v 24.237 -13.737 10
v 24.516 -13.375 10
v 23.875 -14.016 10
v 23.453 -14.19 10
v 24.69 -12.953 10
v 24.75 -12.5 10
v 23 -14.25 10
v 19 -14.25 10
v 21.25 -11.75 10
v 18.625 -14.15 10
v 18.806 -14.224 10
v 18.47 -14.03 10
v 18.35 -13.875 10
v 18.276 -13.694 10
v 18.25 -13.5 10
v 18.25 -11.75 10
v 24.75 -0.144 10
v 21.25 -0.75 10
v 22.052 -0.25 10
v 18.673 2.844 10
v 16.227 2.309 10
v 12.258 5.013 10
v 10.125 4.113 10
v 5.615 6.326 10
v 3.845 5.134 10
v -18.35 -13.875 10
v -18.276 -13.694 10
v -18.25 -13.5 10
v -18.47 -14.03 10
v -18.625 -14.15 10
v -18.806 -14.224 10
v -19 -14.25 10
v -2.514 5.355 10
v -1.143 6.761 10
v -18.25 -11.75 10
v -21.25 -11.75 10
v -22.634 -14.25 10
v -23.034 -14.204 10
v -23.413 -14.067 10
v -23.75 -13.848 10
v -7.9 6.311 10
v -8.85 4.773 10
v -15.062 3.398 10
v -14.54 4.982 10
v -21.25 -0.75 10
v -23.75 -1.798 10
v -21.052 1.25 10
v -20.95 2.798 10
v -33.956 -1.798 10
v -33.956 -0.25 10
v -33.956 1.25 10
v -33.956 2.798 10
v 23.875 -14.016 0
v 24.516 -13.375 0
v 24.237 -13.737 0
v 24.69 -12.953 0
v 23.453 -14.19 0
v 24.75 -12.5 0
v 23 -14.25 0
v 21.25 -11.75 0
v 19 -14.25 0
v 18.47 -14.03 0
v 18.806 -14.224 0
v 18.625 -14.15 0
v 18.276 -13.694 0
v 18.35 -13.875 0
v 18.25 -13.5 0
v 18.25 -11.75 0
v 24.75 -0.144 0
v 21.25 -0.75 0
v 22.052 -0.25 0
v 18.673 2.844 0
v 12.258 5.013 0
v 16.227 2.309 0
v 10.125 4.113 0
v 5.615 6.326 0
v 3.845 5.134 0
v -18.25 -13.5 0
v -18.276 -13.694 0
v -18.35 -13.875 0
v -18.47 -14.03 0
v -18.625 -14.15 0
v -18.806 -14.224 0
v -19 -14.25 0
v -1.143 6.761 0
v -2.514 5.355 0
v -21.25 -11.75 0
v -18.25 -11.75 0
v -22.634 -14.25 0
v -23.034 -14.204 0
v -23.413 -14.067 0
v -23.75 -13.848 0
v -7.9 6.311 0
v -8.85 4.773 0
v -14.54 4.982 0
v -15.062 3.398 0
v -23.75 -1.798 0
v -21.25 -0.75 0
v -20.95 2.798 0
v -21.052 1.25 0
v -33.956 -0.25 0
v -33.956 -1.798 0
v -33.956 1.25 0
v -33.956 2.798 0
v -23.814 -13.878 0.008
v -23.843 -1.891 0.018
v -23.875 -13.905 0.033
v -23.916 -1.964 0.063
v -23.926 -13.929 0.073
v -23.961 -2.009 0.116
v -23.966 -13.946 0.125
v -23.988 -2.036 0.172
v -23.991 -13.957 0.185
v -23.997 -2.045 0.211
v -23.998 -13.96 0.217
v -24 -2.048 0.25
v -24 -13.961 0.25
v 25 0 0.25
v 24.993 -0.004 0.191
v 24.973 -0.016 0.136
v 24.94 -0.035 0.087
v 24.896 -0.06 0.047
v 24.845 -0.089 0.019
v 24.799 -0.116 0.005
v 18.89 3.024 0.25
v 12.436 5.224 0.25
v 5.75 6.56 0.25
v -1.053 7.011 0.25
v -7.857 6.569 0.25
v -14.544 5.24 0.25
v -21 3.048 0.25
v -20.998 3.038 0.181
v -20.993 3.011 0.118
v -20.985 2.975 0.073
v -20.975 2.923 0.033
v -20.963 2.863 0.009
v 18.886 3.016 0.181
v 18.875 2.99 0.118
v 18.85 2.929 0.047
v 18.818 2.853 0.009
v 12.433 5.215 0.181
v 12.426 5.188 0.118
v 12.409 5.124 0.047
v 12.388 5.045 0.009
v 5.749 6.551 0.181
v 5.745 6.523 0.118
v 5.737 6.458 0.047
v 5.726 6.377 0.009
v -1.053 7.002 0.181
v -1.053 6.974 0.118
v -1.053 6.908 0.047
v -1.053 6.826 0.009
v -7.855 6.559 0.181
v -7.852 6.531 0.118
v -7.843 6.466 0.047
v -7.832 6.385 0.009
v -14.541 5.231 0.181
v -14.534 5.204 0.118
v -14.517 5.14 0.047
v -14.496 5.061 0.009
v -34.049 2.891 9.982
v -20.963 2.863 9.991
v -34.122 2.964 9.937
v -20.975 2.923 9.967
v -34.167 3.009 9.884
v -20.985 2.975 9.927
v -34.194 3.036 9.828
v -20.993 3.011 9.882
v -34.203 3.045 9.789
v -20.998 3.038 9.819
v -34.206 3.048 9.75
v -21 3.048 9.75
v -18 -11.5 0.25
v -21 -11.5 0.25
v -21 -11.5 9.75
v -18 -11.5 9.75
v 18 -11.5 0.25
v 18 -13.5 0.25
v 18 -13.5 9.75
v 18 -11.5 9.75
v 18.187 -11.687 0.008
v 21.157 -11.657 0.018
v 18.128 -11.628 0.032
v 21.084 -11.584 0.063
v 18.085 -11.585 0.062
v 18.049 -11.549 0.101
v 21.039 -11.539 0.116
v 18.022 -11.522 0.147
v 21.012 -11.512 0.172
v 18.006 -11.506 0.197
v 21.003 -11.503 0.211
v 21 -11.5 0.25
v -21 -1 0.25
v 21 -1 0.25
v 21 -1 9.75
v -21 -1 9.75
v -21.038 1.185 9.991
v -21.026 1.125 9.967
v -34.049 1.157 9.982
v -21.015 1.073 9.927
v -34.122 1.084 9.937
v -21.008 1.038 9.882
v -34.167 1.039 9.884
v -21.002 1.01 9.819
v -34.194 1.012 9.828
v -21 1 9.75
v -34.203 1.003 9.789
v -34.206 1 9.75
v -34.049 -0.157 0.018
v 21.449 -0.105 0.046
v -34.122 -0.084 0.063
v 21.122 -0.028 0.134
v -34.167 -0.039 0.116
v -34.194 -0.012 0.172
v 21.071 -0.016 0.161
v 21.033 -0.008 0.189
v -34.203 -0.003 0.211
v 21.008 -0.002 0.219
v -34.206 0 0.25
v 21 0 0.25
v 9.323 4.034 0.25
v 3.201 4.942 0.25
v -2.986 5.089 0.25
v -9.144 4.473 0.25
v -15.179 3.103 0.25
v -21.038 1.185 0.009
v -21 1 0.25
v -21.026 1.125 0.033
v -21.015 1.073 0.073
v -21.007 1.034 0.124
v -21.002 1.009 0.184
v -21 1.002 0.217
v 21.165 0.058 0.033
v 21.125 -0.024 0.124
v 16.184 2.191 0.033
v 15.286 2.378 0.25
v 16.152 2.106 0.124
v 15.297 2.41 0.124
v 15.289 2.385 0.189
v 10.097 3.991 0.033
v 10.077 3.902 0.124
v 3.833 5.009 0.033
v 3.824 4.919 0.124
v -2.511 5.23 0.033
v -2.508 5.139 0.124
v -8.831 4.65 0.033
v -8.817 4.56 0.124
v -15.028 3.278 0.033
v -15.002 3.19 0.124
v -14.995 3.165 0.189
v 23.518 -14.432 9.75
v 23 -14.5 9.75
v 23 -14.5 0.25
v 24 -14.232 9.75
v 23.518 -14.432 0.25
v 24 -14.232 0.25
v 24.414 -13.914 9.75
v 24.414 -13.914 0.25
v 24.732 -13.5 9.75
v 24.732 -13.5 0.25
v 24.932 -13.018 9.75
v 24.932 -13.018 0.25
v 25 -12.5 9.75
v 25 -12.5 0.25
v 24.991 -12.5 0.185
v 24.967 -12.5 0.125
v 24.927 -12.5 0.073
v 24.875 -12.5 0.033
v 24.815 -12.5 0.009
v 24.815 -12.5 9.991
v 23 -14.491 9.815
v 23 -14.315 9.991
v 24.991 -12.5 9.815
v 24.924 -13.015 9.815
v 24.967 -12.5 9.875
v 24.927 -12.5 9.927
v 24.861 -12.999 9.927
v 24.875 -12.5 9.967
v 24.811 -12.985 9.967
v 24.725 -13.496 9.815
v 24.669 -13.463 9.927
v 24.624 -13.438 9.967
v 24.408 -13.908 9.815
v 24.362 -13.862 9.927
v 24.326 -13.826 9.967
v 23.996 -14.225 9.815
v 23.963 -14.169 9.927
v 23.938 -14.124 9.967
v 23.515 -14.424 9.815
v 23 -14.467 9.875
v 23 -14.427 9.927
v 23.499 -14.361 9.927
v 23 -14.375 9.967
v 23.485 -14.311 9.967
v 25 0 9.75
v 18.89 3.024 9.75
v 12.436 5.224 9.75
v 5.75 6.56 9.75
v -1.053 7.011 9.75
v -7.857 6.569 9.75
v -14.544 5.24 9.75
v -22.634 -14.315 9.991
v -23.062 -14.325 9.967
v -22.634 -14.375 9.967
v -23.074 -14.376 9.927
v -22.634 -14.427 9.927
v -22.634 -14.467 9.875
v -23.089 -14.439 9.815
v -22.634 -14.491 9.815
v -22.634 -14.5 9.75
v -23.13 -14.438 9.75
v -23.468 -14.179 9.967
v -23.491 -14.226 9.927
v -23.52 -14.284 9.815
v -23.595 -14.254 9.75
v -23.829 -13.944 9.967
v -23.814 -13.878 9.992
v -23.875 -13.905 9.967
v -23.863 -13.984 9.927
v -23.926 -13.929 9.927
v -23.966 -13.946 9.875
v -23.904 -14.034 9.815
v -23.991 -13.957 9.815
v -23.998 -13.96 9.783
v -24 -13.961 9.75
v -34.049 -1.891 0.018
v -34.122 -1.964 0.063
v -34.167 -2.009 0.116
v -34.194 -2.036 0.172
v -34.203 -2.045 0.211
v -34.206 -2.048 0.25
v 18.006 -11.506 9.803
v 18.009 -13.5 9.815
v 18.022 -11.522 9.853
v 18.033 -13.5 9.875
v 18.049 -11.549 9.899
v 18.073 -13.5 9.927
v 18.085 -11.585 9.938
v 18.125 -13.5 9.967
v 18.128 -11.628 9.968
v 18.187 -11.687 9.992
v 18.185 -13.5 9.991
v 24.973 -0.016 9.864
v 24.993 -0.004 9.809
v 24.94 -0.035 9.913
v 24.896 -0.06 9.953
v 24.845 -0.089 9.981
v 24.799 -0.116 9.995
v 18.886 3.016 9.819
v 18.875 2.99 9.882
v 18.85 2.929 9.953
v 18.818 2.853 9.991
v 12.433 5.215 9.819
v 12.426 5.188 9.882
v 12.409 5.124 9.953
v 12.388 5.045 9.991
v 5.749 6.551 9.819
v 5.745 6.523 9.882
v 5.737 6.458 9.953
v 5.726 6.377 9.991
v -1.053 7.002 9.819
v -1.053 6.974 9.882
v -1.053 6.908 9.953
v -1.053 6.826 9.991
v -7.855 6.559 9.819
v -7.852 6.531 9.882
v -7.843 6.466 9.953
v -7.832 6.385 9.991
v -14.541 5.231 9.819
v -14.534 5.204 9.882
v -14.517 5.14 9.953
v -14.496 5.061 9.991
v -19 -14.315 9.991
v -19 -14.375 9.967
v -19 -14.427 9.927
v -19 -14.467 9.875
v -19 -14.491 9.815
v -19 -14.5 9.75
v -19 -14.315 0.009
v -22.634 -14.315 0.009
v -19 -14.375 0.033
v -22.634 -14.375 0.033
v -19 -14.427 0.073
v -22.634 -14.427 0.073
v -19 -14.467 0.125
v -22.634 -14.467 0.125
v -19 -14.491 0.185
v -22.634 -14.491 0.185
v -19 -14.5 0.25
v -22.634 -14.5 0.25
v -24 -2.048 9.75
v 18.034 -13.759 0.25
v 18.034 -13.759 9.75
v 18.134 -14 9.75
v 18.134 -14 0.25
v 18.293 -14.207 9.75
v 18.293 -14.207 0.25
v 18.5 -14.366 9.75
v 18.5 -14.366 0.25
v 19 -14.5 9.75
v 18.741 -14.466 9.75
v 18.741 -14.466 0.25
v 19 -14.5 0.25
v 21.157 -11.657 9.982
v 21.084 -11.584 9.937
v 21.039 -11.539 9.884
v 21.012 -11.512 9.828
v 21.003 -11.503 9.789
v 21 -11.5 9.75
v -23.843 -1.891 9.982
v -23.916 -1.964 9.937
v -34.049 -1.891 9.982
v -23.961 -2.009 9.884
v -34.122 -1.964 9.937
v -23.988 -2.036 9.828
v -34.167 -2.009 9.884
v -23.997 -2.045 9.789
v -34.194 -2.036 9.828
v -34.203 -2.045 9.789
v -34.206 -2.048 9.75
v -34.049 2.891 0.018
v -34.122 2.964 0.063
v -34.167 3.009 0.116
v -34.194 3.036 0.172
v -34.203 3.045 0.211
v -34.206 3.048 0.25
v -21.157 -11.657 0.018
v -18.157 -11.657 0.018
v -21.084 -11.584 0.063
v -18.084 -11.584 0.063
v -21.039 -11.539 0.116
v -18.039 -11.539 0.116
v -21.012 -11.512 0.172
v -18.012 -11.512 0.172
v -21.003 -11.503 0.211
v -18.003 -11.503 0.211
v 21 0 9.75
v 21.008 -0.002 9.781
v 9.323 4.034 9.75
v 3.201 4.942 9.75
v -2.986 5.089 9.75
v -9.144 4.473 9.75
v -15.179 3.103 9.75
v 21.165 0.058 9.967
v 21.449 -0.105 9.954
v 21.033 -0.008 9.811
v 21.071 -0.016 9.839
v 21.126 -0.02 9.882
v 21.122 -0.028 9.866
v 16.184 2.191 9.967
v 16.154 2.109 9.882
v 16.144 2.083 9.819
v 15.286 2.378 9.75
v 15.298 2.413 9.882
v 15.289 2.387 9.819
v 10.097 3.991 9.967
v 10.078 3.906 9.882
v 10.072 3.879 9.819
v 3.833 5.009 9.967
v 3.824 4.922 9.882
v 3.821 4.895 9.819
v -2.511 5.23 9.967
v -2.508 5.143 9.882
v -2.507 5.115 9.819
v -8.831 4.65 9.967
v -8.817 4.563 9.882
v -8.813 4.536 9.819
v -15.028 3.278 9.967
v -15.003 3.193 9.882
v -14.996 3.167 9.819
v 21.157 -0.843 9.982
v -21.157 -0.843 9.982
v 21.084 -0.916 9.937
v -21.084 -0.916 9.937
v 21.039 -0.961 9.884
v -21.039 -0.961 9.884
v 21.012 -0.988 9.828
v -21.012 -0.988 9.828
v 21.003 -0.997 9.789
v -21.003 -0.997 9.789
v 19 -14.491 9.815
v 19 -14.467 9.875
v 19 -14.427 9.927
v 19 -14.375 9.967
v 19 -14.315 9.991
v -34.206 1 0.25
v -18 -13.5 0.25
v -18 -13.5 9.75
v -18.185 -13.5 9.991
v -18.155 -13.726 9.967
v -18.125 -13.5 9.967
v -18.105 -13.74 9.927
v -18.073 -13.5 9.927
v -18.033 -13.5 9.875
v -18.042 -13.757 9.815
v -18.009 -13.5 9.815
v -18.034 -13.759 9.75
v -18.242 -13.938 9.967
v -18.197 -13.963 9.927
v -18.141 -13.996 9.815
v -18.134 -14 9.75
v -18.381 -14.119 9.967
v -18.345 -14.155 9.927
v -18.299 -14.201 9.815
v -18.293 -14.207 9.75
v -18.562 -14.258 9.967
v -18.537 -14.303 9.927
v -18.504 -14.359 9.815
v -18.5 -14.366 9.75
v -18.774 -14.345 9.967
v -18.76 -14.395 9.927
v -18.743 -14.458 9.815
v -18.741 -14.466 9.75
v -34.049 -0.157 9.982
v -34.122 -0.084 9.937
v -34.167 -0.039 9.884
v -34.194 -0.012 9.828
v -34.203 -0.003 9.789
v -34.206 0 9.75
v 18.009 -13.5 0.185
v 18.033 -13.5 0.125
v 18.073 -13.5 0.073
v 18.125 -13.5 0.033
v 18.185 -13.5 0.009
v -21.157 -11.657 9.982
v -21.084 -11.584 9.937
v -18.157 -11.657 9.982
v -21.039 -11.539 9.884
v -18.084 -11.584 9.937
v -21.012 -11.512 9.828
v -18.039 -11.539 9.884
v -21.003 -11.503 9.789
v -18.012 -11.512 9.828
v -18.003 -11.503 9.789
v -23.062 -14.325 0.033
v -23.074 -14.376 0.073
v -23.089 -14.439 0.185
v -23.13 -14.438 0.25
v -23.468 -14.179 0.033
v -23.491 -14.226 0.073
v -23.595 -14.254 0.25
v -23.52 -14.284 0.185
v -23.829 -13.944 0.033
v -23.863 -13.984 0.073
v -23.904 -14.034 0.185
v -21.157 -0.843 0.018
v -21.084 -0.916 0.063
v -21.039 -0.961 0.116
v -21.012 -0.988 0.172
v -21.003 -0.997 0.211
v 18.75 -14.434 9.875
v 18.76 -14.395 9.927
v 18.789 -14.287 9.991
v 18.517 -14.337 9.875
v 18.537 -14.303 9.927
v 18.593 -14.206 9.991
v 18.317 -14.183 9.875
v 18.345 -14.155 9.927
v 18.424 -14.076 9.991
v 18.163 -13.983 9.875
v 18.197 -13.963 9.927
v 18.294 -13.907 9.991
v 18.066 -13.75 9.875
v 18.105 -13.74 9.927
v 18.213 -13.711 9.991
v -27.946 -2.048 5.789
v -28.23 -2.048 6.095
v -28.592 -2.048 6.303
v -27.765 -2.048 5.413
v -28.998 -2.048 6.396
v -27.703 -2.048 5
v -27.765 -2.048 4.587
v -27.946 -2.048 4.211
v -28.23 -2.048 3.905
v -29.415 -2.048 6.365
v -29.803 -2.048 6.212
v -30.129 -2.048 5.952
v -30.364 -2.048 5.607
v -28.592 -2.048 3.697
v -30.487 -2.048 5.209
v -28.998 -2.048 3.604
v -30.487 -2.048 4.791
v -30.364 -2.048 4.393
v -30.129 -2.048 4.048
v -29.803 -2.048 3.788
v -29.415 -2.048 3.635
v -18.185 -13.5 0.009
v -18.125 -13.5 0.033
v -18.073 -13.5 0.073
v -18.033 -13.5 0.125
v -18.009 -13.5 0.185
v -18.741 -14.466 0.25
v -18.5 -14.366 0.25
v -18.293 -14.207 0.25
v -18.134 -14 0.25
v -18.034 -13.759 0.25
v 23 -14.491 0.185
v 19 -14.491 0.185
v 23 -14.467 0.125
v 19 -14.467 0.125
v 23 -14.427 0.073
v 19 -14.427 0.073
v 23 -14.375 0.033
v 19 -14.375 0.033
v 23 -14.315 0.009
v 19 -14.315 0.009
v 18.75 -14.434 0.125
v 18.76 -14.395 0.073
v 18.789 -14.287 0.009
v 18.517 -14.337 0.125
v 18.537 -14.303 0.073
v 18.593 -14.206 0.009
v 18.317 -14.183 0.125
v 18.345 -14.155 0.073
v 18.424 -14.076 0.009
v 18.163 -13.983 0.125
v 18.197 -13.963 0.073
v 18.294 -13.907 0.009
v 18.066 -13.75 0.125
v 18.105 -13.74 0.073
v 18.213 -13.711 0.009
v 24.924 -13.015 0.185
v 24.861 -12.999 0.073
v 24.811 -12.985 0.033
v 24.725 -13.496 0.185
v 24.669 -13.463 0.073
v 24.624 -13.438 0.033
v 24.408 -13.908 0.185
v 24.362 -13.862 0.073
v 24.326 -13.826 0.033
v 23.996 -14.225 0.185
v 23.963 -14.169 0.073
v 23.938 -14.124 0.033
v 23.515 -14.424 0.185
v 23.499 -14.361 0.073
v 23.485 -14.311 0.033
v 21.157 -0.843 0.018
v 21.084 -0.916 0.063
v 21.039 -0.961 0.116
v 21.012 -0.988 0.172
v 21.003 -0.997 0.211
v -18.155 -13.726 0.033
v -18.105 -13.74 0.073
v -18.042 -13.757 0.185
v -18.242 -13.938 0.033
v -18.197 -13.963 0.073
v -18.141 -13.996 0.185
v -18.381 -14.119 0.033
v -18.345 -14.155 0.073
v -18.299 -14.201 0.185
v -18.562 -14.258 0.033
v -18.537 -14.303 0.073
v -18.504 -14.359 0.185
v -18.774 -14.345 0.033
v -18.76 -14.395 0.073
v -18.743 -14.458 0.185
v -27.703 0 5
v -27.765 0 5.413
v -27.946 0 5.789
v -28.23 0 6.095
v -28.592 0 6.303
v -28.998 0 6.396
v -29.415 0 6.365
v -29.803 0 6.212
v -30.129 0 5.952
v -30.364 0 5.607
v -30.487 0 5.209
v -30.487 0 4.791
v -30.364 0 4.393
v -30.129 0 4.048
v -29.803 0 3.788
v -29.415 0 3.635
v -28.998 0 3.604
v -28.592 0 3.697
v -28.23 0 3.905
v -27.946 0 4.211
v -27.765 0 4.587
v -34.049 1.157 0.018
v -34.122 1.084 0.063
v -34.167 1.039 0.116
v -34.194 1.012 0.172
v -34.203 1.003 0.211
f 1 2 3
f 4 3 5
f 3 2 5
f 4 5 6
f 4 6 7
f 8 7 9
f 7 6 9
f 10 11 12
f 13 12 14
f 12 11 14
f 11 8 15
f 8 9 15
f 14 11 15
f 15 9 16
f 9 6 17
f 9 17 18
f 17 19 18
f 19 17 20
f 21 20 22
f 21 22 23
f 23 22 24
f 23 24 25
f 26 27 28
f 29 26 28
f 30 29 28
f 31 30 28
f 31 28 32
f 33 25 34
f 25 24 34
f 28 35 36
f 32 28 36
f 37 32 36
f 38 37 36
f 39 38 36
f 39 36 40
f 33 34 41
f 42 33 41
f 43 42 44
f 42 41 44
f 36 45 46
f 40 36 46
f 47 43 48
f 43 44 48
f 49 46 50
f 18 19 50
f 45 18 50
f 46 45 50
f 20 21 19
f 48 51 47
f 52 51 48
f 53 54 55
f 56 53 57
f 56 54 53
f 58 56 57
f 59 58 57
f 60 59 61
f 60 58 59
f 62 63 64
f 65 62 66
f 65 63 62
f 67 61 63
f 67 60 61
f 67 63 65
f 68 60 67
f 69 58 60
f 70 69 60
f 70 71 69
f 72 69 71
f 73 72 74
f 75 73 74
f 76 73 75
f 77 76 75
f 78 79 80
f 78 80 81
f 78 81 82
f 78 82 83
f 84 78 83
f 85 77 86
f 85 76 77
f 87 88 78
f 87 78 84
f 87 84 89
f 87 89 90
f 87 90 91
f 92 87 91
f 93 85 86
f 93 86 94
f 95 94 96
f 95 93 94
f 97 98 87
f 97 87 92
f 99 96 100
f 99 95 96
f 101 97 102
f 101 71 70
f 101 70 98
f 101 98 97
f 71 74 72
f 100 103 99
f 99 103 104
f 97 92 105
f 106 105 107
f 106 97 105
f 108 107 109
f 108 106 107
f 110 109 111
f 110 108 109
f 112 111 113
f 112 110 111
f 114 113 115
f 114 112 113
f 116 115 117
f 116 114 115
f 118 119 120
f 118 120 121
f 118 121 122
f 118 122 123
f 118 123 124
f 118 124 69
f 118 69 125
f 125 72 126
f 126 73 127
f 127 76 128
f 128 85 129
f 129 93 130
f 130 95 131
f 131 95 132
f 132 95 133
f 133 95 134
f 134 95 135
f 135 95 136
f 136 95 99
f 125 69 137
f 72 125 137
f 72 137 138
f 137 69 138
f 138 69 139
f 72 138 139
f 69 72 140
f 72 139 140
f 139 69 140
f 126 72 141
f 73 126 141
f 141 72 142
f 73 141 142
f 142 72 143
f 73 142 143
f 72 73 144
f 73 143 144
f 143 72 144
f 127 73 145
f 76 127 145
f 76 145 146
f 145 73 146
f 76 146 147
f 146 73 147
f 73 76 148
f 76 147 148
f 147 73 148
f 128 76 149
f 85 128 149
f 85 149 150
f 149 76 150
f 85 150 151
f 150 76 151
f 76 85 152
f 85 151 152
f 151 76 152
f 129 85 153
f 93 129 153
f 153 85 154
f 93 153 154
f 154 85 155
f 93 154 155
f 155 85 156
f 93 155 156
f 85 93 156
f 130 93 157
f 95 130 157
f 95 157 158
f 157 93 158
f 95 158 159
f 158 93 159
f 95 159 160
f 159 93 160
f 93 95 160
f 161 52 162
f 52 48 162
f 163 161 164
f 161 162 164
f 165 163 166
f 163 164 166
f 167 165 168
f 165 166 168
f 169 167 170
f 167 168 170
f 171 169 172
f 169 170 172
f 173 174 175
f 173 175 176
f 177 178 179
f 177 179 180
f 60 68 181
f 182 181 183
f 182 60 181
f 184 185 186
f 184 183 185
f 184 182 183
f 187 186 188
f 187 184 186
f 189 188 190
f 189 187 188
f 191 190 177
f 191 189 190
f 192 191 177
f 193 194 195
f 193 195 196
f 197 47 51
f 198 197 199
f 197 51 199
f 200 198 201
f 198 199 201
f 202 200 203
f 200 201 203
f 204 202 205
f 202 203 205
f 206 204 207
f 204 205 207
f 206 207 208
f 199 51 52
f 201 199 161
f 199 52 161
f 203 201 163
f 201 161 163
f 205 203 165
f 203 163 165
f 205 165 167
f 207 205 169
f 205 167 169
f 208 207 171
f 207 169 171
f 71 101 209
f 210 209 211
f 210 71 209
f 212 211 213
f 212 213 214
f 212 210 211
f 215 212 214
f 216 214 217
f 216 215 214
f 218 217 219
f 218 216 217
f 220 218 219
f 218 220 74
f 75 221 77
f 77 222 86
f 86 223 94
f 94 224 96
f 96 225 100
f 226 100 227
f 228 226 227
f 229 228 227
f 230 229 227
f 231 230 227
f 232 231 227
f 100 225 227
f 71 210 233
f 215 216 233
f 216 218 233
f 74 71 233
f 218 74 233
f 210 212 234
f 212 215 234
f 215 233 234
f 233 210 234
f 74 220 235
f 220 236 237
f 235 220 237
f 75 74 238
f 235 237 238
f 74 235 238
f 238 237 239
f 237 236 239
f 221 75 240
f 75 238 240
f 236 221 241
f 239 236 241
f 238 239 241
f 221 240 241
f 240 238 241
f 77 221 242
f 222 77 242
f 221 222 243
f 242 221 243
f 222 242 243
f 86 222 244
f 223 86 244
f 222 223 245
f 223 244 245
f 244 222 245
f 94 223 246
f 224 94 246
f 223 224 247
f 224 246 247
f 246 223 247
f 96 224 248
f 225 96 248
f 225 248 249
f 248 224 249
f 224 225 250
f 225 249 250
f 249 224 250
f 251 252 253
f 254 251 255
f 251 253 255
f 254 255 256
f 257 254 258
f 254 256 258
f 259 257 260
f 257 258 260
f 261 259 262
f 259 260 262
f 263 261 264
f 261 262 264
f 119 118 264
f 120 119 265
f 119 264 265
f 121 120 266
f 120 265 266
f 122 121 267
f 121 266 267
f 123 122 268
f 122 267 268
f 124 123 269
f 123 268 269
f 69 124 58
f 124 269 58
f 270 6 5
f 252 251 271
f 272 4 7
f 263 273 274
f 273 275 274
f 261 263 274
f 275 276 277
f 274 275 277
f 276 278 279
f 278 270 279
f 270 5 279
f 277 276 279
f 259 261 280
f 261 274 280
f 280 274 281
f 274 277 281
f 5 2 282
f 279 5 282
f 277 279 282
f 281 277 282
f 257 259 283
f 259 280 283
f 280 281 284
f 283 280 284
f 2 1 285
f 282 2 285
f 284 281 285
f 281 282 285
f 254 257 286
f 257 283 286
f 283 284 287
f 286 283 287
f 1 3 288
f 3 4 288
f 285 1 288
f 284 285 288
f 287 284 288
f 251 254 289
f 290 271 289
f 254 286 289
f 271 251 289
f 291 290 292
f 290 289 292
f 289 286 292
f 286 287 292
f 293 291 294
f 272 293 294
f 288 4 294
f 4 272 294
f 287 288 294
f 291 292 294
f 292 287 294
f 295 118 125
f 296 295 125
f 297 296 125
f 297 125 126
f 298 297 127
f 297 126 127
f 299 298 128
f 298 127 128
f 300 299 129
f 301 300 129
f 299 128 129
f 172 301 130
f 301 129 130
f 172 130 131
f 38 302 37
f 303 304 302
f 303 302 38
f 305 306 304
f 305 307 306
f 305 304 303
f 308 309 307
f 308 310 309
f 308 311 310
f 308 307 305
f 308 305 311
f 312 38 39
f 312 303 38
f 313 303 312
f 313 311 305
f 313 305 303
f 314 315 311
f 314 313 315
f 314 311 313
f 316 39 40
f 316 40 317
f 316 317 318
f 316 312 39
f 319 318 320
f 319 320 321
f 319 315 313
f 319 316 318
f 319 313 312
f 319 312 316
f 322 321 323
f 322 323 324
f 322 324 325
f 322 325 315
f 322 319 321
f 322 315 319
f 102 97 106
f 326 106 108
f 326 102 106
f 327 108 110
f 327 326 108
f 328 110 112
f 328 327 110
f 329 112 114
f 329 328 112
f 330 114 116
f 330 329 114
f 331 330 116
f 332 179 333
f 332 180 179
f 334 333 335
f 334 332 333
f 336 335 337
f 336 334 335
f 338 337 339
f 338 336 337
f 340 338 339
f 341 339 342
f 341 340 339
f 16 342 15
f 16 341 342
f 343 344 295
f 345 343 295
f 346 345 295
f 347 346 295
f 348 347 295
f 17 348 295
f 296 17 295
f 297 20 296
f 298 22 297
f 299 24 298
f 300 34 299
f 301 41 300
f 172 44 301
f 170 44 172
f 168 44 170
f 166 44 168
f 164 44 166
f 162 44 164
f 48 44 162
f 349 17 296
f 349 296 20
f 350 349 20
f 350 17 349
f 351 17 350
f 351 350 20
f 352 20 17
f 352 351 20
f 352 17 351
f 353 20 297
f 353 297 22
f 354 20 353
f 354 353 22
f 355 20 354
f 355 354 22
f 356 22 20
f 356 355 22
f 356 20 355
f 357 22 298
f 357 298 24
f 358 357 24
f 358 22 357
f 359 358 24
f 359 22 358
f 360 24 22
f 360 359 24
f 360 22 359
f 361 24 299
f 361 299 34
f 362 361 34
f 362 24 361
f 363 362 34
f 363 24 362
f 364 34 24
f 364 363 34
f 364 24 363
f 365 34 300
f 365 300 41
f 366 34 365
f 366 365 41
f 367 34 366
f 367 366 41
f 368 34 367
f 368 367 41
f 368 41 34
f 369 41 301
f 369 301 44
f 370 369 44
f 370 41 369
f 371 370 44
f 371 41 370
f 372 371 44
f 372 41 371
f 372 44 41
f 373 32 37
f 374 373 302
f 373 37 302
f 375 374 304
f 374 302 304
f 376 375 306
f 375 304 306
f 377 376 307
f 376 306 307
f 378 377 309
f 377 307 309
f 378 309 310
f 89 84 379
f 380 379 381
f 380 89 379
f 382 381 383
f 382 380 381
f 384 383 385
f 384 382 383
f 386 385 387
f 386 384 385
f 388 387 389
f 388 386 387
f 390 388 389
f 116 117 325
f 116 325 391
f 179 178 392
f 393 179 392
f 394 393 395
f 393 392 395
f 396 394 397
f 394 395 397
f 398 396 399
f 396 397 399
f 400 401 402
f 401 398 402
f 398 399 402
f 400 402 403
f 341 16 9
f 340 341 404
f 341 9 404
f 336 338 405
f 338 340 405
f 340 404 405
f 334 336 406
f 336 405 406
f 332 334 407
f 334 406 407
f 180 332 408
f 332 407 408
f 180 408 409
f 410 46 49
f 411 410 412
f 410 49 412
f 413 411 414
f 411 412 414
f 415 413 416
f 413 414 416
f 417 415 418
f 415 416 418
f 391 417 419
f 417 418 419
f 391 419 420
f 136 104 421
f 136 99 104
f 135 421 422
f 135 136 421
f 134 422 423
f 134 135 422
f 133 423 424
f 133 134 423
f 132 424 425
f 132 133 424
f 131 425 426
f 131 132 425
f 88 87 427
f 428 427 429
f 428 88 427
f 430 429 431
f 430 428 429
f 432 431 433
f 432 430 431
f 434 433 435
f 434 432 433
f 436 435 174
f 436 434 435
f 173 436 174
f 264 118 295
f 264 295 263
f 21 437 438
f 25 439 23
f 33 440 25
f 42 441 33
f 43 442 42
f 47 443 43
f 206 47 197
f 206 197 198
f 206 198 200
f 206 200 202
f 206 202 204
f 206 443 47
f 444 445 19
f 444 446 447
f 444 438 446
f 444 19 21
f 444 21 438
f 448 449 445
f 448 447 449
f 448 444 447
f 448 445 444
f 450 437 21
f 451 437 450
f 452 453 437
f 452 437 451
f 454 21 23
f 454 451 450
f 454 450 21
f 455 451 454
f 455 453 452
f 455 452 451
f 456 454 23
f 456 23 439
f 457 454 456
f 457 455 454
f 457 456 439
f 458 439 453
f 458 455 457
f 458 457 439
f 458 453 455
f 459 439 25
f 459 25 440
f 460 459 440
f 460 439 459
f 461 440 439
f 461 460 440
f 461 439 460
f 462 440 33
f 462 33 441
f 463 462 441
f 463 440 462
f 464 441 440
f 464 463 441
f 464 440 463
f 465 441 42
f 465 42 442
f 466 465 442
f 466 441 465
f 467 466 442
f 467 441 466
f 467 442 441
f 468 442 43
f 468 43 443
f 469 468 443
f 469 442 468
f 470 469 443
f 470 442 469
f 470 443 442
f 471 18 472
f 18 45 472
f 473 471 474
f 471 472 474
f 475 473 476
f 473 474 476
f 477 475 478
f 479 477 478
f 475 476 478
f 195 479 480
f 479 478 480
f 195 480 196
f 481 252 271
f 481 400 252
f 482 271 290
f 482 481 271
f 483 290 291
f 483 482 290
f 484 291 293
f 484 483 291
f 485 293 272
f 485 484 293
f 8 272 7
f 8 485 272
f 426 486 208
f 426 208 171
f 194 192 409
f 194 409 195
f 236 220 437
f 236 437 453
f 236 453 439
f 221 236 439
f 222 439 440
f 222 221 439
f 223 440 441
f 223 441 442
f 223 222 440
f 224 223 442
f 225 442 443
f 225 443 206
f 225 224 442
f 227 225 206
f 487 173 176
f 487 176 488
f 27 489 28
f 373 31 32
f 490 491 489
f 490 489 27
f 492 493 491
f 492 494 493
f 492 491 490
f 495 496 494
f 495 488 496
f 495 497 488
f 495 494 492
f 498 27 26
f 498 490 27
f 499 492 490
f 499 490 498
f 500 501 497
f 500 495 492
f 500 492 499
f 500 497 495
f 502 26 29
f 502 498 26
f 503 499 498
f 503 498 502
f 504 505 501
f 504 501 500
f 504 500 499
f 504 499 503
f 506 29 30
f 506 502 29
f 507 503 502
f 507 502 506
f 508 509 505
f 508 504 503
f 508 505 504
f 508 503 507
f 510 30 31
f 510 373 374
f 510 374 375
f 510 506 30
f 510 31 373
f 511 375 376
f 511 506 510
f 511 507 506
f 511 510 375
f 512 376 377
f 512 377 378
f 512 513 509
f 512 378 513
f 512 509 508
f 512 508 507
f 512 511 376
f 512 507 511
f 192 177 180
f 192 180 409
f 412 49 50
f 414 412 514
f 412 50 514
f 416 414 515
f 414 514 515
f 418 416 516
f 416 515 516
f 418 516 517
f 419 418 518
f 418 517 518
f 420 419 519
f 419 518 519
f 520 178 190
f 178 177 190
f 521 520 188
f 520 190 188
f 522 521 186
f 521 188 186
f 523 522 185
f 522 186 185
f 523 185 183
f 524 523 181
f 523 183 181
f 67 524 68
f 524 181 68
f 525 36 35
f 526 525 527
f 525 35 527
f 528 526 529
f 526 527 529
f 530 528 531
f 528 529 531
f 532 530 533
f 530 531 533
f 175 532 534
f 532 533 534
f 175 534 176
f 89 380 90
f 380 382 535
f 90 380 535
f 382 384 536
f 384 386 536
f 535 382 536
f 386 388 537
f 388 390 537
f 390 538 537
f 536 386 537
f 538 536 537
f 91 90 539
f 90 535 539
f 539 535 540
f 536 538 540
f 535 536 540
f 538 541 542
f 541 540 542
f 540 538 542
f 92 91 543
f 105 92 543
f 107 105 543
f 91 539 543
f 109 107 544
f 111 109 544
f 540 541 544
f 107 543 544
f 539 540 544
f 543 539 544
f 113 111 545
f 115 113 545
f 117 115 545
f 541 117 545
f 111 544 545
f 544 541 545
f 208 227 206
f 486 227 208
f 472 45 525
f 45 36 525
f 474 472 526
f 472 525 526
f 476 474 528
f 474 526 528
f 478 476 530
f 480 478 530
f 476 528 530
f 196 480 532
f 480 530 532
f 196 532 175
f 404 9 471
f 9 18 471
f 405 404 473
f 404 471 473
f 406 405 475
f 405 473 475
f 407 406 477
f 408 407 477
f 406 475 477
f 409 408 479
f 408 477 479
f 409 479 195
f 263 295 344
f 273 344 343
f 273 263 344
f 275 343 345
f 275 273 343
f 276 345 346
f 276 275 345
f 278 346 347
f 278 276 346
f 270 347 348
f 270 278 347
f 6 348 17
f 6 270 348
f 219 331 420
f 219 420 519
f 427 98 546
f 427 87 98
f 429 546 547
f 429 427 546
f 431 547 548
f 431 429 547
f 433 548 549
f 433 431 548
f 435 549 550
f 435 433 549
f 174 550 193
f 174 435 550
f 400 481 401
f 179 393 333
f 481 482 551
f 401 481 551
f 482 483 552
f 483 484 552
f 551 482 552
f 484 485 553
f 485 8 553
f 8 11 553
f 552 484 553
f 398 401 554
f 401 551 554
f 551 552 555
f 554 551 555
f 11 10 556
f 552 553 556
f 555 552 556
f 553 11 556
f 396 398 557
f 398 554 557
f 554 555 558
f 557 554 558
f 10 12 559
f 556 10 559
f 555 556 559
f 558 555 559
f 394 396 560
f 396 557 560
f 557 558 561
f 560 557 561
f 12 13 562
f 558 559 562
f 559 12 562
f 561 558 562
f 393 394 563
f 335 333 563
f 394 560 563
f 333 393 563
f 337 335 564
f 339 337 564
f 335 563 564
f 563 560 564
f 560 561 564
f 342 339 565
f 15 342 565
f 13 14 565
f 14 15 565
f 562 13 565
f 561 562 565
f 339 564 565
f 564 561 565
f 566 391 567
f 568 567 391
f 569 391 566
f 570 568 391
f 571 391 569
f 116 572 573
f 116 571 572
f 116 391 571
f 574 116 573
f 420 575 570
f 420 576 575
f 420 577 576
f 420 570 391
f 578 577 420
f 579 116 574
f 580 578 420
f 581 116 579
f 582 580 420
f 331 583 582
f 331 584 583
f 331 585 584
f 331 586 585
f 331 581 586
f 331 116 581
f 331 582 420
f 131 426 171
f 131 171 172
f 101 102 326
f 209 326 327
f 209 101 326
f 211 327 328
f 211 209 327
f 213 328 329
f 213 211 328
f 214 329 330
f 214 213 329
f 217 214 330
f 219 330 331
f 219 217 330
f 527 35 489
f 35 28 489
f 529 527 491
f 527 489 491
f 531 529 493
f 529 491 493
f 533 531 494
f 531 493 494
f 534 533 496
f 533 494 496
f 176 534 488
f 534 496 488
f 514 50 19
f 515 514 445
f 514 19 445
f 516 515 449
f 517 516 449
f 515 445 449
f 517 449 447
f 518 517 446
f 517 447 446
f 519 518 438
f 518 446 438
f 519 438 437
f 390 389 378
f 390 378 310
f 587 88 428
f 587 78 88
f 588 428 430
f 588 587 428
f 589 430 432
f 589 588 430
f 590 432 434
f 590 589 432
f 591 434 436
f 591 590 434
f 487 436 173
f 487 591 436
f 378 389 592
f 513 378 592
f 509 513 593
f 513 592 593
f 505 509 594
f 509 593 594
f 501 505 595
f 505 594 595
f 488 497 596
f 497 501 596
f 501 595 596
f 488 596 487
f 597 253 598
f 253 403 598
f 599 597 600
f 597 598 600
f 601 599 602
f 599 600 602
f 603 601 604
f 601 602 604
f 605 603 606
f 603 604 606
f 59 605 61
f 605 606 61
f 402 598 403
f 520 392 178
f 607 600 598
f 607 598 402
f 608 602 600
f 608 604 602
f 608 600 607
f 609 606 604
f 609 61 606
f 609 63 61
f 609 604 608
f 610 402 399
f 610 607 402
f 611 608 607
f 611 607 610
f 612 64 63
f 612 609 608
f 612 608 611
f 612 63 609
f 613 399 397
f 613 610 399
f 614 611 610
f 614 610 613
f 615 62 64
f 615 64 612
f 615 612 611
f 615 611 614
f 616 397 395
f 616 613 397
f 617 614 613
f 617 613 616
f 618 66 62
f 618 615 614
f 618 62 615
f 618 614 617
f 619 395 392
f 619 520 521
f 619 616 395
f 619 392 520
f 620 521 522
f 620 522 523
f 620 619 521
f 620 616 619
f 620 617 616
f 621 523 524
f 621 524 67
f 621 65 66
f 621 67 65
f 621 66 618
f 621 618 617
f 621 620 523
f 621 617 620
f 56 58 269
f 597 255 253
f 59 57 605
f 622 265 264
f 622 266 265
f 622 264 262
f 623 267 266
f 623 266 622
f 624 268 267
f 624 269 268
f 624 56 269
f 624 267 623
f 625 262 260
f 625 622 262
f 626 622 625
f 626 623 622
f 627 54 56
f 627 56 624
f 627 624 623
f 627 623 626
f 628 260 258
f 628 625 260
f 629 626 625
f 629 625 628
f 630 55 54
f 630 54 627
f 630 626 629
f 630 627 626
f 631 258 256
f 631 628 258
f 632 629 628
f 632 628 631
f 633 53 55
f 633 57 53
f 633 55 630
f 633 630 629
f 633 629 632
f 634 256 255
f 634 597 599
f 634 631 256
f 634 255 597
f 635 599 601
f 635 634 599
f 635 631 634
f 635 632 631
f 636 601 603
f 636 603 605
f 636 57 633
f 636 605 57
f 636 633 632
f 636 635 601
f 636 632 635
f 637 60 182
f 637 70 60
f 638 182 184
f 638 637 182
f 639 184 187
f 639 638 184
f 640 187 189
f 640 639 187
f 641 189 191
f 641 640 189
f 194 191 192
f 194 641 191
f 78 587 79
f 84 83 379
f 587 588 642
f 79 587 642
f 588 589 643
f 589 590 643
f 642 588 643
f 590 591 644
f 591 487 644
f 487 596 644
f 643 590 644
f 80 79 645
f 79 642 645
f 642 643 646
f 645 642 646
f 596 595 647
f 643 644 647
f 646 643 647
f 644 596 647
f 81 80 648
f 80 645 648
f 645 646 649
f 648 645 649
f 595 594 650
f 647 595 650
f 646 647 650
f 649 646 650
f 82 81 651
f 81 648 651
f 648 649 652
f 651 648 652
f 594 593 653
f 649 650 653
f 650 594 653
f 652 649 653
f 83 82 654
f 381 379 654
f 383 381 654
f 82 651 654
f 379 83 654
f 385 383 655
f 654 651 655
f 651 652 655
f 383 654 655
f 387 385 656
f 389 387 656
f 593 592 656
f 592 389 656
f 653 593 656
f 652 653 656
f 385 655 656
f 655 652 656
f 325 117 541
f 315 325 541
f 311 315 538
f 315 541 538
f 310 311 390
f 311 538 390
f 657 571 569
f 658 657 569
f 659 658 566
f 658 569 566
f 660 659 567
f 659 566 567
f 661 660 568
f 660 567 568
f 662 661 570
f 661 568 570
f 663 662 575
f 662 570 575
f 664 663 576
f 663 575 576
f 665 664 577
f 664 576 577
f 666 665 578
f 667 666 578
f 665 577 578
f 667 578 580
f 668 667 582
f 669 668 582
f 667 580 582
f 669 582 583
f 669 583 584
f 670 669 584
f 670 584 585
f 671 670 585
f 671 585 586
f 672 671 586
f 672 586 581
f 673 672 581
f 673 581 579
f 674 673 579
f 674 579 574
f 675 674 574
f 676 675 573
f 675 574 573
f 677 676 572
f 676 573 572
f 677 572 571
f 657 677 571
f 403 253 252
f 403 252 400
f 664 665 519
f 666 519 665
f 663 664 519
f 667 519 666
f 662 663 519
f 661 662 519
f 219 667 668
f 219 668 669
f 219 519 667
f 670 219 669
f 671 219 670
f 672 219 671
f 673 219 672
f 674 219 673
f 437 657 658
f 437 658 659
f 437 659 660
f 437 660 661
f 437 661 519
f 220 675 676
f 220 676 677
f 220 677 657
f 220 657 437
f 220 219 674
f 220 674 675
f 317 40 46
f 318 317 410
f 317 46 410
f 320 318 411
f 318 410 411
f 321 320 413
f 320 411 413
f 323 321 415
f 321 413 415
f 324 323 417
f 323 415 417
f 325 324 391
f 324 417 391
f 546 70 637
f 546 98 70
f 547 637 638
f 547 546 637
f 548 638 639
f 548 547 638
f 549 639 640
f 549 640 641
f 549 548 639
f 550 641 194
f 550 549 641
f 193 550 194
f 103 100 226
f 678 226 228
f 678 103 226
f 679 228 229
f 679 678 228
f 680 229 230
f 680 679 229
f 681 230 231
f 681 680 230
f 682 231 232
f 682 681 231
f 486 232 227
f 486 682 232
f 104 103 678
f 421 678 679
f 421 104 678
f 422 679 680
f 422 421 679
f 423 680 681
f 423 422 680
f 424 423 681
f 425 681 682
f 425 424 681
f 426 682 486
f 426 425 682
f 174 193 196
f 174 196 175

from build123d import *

# Parameters (mm, degrees)
PAD_DEPTH       = 10
SKETCH001_W     = 9.110509
SKETCH001_H     = 17.177114
POCKET_DEPTH    = 3.001
SKETCH002_R     = 1.4
POCKET001_DEPTH = 2.048058
FILLET_R        = 0.25


with BuildPart() as part:
    # Sketch → Pad (new body)
    with BuildSketch(Plane.XY):
        with BuildLine():
            Line((25, 0), (25, -12.5))
            ThreePointArc((23, -14.5), (24.414214, -13.914214), (25, -12.5))
            Line((23, -14.5), (19, -14.5))
            ThreePointArc((18, -13.5), (18.292893, -14.207107), (19, -14.5))
            Line((18, -13.5), (18, -11.5))
            Line((18, -11.5), (21, -11.5))
            Line((21, -11.5), (21, -1))
            Line((21, -1), (-21, -1))
            Line((-21, -1), (-21, -11.5))
            Line((-21, -11.5), (-18, -11.5))
            Line((-18, -11.5), (-18, -13.5))
            ThreePointArc((-19, -14.5), (-18.292893, -14.207107), (-18, -13.5))
            Line((-19, -14.5), (-22.634118, -14.5))
            ThreePointArc((-24, -13.960947), (-23.36832, -14.360362), (-22.634118, -14.5))
            Line((-24, -13.960947), (-24, -2.048058))
            Line((-24, -2.048058), (-34.206213, -2.048058))
            Line((-34.206213, -2.048058), (-34.206213, 0))
            Line((-34.206213, 0), (-21, 0))
            Line((-21, 0), (21, 0))
            ThreePointArc((21, 0), (0.10979, 5.111176), (-21, 1))
            Line((-21, 1), (-34.206213, 1))
            Line((-34.206213, 1), (-34.206213, 3.048058))
            Line((-34.206213, 3.048058), (-21, 3.048058))
            ThreePointArc((25, 0), (2.356054, 6.897451), (-21, 3.048058))
        make_face()
    extrude(amount=PAD_DEPTH)

    # Sketch001 (on Face16 of Pad) → Pocket (cut, through all)
    with BuildSketch(Plane(origin=(0, -11.5, 0), x_dir=(-1, 0, 0), z_dir=(0, 1, 0))):
        with Locations((-4.555255, 16.023105)):
            Rectangle(SKETCH001_W, SKETCH001_H)
    extrude(amount=-POCKET_DEPTH, mode=Mode.SUBTRACT)

    # Sketch002 (on Face2 of Pad) → Pocket001 (cut)
    with BuildSketch(Plane.XZ.offset(2.048058)):
        with Locations((-29.103106, 5)):
            Circle(SKETCH002_R)
    extrude(amount=-POCKET001_DEPTH, mode=Mode.SUBTRACT)

    # Fillet
    fillet_edges = [part.edges().sort_by_distance(p)[0] for p in [
        (-24, -8.004502, 0),
        (-29.103106, -2.048058, 0),
        (-34.206213, -1.024029, 0),
        (-27.603106, 0, 0),
        (0, 0, 0),
        (0.10979, 5.111176, 0),
        (-27.603106, 1, 0),
        (-34.206213, 2.024029, 0),
        (-27.603106, 3.048058, 0),
        (2.356054, 6.897451, 0),
        (25, -6.25, 0),
        (24.414214, -13.914214, 0),
        (21, -14.5, 0),
        (18.292893, -14.207107, 0),
        (18, -12.5, 0),
        (19.5, -11.5, 0),
        (21, -6.25, 0),
        (0, -1, 0),
        (-21, -6.25, 0),
        (-19.5, -11.5, 0),
        (-18, -12.5, 0),
        (-18.292893, -14.207107, 0),
        (-20.817059, -14.5, 0),
        (-23.36832, -14.360362, 0),
        (-24, -8.004502, 10),
        (-29.103106, -2.048058, 10),
        (-34.206213, -1.024029, 10),
        (-27.603106, 0, 10),
        (0, 0, 10),
        (0.10979, 5.111176, 10),
        (-27.603106, 1, 10),
        (-34.206213, 2.024029, 10),
        (-27.603106, 3.048058, 10),
        (2.356054, 6.897451, 10),
        (25, -6.25, 10),
        (24.414214, -13.914214, 10),
        (21, -14.5, 10),
        (18.292893, -14.207107, 10),
        (18, -12.5, 10),
        (19.5, -11.5, 10),
        (21, -6.25, 10),
        (0, -1, 10),
        (-21, -6.25, 10),
        (-19.5, -11.5, 10),
        (-18, -12.5, 10),
        (-18.292893, -14.207107, 10),
        (-20.817059, -14.5, 10),
        (-23.36832, -14.360362, 10),
    ]]
    fillet(fillet_edges, radius=FILLET_R)


solid = part.part
